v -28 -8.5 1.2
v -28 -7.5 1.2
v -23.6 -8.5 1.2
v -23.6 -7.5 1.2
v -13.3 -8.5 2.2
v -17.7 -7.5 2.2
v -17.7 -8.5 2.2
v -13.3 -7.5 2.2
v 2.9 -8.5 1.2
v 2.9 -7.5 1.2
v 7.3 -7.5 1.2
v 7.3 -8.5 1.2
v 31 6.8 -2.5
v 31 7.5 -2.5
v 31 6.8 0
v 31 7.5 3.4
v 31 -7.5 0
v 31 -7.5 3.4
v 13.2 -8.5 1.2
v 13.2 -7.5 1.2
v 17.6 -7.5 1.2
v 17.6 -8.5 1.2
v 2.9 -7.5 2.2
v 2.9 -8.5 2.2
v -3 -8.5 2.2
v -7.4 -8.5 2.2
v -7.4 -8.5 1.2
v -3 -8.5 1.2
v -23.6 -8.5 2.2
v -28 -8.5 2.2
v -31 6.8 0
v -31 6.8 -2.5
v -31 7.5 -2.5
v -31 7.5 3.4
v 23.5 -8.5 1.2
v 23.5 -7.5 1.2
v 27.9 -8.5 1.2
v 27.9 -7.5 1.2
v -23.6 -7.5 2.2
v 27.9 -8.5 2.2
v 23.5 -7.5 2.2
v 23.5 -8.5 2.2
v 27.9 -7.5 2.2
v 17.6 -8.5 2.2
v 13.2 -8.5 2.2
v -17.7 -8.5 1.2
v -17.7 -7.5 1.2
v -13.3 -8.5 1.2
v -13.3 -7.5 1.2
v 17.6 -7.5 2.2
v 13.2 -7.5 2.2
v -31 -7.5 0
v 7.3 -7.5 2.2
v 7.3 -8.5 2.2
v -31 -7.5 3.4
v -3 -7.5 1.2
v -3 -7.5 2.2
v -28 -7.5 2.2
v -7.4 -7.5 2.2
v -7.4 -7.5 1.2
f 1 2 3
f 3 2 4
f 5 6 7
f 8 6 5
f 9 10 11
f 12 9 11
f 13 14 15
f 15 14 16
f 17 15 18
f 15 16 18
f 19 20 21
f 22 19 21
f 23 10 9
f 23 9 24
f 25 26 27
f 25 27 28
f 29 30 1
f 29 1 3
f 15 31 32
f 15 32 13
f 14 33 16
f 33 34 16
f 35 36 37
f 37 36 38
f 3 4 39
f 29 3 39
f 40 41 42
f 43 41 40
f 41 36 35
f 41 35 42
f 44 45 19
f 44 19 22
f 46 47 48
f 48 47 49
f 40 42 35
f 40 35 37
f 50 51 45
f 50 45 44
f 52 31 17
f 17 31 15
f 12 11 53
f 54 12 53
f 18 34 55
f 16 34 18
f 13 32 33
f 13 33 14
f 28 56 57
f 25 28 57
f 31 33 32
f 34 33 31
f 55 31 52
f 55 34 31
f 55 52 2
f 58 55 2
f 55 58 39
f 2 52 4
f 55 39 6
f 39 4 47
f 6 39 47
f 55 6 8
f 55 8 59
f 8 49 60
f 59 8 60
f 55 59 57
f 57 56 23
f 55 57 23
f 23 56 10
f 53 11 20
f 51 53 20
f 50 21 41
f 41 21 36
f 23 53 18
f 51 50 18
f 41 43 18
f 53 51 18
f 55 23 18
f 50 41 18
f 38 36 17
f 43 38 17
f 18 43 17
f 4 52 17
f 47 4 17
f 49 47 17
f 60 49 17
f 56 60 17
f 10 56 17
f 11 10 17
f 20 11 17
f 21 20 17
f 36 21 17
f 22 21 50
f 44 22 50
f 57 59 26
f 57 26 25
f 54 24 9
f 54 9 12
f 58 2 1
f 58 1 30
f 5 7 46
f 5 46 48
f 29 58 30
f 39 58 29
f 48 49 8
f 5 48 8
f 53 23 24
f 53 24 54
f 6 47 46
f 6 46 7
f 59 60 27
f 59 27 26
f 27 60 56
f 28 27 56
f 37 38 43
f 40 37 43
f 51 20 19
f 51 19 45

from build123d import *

# Parameters (mm, degrees)
F0_W     = 62
F0_H     = 15
F1_DEPTH = 3.4
F2_W     = 62
F2_H     = 0.7
F3_DEPTH = 2.5
F4_W     = 4.4
F4_H     = 1
F5_DEPTH = 1


with BuildPart() as f1:
    # F0 (on Top) → F1 (new body)
    with BuildSketch(Plane.XY):
        Rectangle(F0_W, F0_H)
    extrude(amount=F1_DEPTH)

    # F2 (on face) → F3 (join)
    with BuildSketch(Plane(origin=(0, 0, 0), x_dir=(1, 0, 0), z_dir=(0, 0, -1))):
        with Locations((0, -7.15)):
            Rectangle(F2_W, F2_H)
    extrude(amount=F3_DEPTH)

    # F4 (on face) → F5 (join)
    with BuildSketch(Plane.XZ.offset(7.5)):
        with Locations((-25.8, 1.7)):
            Rectangle(F4_W, F4_H)
        with Locations((-15.5, 1.7)):
            Rectangle(F4_W, F4_H)
        with Locations((-5.2, 1.7)):
            Rectangle(F4_W, F4_H)
        with Locations((5.1, 1.7)):
            Rectangle(F4_W, F4_H)
        with Locations((15.4, 1.7)):
            Rectangle(F4_W, F4_H)
        with Locations((25.7, 1.7)):
            Rectangle(F4_W, F4_H)
    extrude(amount=F5_DEPTH)


solid = f1.part
